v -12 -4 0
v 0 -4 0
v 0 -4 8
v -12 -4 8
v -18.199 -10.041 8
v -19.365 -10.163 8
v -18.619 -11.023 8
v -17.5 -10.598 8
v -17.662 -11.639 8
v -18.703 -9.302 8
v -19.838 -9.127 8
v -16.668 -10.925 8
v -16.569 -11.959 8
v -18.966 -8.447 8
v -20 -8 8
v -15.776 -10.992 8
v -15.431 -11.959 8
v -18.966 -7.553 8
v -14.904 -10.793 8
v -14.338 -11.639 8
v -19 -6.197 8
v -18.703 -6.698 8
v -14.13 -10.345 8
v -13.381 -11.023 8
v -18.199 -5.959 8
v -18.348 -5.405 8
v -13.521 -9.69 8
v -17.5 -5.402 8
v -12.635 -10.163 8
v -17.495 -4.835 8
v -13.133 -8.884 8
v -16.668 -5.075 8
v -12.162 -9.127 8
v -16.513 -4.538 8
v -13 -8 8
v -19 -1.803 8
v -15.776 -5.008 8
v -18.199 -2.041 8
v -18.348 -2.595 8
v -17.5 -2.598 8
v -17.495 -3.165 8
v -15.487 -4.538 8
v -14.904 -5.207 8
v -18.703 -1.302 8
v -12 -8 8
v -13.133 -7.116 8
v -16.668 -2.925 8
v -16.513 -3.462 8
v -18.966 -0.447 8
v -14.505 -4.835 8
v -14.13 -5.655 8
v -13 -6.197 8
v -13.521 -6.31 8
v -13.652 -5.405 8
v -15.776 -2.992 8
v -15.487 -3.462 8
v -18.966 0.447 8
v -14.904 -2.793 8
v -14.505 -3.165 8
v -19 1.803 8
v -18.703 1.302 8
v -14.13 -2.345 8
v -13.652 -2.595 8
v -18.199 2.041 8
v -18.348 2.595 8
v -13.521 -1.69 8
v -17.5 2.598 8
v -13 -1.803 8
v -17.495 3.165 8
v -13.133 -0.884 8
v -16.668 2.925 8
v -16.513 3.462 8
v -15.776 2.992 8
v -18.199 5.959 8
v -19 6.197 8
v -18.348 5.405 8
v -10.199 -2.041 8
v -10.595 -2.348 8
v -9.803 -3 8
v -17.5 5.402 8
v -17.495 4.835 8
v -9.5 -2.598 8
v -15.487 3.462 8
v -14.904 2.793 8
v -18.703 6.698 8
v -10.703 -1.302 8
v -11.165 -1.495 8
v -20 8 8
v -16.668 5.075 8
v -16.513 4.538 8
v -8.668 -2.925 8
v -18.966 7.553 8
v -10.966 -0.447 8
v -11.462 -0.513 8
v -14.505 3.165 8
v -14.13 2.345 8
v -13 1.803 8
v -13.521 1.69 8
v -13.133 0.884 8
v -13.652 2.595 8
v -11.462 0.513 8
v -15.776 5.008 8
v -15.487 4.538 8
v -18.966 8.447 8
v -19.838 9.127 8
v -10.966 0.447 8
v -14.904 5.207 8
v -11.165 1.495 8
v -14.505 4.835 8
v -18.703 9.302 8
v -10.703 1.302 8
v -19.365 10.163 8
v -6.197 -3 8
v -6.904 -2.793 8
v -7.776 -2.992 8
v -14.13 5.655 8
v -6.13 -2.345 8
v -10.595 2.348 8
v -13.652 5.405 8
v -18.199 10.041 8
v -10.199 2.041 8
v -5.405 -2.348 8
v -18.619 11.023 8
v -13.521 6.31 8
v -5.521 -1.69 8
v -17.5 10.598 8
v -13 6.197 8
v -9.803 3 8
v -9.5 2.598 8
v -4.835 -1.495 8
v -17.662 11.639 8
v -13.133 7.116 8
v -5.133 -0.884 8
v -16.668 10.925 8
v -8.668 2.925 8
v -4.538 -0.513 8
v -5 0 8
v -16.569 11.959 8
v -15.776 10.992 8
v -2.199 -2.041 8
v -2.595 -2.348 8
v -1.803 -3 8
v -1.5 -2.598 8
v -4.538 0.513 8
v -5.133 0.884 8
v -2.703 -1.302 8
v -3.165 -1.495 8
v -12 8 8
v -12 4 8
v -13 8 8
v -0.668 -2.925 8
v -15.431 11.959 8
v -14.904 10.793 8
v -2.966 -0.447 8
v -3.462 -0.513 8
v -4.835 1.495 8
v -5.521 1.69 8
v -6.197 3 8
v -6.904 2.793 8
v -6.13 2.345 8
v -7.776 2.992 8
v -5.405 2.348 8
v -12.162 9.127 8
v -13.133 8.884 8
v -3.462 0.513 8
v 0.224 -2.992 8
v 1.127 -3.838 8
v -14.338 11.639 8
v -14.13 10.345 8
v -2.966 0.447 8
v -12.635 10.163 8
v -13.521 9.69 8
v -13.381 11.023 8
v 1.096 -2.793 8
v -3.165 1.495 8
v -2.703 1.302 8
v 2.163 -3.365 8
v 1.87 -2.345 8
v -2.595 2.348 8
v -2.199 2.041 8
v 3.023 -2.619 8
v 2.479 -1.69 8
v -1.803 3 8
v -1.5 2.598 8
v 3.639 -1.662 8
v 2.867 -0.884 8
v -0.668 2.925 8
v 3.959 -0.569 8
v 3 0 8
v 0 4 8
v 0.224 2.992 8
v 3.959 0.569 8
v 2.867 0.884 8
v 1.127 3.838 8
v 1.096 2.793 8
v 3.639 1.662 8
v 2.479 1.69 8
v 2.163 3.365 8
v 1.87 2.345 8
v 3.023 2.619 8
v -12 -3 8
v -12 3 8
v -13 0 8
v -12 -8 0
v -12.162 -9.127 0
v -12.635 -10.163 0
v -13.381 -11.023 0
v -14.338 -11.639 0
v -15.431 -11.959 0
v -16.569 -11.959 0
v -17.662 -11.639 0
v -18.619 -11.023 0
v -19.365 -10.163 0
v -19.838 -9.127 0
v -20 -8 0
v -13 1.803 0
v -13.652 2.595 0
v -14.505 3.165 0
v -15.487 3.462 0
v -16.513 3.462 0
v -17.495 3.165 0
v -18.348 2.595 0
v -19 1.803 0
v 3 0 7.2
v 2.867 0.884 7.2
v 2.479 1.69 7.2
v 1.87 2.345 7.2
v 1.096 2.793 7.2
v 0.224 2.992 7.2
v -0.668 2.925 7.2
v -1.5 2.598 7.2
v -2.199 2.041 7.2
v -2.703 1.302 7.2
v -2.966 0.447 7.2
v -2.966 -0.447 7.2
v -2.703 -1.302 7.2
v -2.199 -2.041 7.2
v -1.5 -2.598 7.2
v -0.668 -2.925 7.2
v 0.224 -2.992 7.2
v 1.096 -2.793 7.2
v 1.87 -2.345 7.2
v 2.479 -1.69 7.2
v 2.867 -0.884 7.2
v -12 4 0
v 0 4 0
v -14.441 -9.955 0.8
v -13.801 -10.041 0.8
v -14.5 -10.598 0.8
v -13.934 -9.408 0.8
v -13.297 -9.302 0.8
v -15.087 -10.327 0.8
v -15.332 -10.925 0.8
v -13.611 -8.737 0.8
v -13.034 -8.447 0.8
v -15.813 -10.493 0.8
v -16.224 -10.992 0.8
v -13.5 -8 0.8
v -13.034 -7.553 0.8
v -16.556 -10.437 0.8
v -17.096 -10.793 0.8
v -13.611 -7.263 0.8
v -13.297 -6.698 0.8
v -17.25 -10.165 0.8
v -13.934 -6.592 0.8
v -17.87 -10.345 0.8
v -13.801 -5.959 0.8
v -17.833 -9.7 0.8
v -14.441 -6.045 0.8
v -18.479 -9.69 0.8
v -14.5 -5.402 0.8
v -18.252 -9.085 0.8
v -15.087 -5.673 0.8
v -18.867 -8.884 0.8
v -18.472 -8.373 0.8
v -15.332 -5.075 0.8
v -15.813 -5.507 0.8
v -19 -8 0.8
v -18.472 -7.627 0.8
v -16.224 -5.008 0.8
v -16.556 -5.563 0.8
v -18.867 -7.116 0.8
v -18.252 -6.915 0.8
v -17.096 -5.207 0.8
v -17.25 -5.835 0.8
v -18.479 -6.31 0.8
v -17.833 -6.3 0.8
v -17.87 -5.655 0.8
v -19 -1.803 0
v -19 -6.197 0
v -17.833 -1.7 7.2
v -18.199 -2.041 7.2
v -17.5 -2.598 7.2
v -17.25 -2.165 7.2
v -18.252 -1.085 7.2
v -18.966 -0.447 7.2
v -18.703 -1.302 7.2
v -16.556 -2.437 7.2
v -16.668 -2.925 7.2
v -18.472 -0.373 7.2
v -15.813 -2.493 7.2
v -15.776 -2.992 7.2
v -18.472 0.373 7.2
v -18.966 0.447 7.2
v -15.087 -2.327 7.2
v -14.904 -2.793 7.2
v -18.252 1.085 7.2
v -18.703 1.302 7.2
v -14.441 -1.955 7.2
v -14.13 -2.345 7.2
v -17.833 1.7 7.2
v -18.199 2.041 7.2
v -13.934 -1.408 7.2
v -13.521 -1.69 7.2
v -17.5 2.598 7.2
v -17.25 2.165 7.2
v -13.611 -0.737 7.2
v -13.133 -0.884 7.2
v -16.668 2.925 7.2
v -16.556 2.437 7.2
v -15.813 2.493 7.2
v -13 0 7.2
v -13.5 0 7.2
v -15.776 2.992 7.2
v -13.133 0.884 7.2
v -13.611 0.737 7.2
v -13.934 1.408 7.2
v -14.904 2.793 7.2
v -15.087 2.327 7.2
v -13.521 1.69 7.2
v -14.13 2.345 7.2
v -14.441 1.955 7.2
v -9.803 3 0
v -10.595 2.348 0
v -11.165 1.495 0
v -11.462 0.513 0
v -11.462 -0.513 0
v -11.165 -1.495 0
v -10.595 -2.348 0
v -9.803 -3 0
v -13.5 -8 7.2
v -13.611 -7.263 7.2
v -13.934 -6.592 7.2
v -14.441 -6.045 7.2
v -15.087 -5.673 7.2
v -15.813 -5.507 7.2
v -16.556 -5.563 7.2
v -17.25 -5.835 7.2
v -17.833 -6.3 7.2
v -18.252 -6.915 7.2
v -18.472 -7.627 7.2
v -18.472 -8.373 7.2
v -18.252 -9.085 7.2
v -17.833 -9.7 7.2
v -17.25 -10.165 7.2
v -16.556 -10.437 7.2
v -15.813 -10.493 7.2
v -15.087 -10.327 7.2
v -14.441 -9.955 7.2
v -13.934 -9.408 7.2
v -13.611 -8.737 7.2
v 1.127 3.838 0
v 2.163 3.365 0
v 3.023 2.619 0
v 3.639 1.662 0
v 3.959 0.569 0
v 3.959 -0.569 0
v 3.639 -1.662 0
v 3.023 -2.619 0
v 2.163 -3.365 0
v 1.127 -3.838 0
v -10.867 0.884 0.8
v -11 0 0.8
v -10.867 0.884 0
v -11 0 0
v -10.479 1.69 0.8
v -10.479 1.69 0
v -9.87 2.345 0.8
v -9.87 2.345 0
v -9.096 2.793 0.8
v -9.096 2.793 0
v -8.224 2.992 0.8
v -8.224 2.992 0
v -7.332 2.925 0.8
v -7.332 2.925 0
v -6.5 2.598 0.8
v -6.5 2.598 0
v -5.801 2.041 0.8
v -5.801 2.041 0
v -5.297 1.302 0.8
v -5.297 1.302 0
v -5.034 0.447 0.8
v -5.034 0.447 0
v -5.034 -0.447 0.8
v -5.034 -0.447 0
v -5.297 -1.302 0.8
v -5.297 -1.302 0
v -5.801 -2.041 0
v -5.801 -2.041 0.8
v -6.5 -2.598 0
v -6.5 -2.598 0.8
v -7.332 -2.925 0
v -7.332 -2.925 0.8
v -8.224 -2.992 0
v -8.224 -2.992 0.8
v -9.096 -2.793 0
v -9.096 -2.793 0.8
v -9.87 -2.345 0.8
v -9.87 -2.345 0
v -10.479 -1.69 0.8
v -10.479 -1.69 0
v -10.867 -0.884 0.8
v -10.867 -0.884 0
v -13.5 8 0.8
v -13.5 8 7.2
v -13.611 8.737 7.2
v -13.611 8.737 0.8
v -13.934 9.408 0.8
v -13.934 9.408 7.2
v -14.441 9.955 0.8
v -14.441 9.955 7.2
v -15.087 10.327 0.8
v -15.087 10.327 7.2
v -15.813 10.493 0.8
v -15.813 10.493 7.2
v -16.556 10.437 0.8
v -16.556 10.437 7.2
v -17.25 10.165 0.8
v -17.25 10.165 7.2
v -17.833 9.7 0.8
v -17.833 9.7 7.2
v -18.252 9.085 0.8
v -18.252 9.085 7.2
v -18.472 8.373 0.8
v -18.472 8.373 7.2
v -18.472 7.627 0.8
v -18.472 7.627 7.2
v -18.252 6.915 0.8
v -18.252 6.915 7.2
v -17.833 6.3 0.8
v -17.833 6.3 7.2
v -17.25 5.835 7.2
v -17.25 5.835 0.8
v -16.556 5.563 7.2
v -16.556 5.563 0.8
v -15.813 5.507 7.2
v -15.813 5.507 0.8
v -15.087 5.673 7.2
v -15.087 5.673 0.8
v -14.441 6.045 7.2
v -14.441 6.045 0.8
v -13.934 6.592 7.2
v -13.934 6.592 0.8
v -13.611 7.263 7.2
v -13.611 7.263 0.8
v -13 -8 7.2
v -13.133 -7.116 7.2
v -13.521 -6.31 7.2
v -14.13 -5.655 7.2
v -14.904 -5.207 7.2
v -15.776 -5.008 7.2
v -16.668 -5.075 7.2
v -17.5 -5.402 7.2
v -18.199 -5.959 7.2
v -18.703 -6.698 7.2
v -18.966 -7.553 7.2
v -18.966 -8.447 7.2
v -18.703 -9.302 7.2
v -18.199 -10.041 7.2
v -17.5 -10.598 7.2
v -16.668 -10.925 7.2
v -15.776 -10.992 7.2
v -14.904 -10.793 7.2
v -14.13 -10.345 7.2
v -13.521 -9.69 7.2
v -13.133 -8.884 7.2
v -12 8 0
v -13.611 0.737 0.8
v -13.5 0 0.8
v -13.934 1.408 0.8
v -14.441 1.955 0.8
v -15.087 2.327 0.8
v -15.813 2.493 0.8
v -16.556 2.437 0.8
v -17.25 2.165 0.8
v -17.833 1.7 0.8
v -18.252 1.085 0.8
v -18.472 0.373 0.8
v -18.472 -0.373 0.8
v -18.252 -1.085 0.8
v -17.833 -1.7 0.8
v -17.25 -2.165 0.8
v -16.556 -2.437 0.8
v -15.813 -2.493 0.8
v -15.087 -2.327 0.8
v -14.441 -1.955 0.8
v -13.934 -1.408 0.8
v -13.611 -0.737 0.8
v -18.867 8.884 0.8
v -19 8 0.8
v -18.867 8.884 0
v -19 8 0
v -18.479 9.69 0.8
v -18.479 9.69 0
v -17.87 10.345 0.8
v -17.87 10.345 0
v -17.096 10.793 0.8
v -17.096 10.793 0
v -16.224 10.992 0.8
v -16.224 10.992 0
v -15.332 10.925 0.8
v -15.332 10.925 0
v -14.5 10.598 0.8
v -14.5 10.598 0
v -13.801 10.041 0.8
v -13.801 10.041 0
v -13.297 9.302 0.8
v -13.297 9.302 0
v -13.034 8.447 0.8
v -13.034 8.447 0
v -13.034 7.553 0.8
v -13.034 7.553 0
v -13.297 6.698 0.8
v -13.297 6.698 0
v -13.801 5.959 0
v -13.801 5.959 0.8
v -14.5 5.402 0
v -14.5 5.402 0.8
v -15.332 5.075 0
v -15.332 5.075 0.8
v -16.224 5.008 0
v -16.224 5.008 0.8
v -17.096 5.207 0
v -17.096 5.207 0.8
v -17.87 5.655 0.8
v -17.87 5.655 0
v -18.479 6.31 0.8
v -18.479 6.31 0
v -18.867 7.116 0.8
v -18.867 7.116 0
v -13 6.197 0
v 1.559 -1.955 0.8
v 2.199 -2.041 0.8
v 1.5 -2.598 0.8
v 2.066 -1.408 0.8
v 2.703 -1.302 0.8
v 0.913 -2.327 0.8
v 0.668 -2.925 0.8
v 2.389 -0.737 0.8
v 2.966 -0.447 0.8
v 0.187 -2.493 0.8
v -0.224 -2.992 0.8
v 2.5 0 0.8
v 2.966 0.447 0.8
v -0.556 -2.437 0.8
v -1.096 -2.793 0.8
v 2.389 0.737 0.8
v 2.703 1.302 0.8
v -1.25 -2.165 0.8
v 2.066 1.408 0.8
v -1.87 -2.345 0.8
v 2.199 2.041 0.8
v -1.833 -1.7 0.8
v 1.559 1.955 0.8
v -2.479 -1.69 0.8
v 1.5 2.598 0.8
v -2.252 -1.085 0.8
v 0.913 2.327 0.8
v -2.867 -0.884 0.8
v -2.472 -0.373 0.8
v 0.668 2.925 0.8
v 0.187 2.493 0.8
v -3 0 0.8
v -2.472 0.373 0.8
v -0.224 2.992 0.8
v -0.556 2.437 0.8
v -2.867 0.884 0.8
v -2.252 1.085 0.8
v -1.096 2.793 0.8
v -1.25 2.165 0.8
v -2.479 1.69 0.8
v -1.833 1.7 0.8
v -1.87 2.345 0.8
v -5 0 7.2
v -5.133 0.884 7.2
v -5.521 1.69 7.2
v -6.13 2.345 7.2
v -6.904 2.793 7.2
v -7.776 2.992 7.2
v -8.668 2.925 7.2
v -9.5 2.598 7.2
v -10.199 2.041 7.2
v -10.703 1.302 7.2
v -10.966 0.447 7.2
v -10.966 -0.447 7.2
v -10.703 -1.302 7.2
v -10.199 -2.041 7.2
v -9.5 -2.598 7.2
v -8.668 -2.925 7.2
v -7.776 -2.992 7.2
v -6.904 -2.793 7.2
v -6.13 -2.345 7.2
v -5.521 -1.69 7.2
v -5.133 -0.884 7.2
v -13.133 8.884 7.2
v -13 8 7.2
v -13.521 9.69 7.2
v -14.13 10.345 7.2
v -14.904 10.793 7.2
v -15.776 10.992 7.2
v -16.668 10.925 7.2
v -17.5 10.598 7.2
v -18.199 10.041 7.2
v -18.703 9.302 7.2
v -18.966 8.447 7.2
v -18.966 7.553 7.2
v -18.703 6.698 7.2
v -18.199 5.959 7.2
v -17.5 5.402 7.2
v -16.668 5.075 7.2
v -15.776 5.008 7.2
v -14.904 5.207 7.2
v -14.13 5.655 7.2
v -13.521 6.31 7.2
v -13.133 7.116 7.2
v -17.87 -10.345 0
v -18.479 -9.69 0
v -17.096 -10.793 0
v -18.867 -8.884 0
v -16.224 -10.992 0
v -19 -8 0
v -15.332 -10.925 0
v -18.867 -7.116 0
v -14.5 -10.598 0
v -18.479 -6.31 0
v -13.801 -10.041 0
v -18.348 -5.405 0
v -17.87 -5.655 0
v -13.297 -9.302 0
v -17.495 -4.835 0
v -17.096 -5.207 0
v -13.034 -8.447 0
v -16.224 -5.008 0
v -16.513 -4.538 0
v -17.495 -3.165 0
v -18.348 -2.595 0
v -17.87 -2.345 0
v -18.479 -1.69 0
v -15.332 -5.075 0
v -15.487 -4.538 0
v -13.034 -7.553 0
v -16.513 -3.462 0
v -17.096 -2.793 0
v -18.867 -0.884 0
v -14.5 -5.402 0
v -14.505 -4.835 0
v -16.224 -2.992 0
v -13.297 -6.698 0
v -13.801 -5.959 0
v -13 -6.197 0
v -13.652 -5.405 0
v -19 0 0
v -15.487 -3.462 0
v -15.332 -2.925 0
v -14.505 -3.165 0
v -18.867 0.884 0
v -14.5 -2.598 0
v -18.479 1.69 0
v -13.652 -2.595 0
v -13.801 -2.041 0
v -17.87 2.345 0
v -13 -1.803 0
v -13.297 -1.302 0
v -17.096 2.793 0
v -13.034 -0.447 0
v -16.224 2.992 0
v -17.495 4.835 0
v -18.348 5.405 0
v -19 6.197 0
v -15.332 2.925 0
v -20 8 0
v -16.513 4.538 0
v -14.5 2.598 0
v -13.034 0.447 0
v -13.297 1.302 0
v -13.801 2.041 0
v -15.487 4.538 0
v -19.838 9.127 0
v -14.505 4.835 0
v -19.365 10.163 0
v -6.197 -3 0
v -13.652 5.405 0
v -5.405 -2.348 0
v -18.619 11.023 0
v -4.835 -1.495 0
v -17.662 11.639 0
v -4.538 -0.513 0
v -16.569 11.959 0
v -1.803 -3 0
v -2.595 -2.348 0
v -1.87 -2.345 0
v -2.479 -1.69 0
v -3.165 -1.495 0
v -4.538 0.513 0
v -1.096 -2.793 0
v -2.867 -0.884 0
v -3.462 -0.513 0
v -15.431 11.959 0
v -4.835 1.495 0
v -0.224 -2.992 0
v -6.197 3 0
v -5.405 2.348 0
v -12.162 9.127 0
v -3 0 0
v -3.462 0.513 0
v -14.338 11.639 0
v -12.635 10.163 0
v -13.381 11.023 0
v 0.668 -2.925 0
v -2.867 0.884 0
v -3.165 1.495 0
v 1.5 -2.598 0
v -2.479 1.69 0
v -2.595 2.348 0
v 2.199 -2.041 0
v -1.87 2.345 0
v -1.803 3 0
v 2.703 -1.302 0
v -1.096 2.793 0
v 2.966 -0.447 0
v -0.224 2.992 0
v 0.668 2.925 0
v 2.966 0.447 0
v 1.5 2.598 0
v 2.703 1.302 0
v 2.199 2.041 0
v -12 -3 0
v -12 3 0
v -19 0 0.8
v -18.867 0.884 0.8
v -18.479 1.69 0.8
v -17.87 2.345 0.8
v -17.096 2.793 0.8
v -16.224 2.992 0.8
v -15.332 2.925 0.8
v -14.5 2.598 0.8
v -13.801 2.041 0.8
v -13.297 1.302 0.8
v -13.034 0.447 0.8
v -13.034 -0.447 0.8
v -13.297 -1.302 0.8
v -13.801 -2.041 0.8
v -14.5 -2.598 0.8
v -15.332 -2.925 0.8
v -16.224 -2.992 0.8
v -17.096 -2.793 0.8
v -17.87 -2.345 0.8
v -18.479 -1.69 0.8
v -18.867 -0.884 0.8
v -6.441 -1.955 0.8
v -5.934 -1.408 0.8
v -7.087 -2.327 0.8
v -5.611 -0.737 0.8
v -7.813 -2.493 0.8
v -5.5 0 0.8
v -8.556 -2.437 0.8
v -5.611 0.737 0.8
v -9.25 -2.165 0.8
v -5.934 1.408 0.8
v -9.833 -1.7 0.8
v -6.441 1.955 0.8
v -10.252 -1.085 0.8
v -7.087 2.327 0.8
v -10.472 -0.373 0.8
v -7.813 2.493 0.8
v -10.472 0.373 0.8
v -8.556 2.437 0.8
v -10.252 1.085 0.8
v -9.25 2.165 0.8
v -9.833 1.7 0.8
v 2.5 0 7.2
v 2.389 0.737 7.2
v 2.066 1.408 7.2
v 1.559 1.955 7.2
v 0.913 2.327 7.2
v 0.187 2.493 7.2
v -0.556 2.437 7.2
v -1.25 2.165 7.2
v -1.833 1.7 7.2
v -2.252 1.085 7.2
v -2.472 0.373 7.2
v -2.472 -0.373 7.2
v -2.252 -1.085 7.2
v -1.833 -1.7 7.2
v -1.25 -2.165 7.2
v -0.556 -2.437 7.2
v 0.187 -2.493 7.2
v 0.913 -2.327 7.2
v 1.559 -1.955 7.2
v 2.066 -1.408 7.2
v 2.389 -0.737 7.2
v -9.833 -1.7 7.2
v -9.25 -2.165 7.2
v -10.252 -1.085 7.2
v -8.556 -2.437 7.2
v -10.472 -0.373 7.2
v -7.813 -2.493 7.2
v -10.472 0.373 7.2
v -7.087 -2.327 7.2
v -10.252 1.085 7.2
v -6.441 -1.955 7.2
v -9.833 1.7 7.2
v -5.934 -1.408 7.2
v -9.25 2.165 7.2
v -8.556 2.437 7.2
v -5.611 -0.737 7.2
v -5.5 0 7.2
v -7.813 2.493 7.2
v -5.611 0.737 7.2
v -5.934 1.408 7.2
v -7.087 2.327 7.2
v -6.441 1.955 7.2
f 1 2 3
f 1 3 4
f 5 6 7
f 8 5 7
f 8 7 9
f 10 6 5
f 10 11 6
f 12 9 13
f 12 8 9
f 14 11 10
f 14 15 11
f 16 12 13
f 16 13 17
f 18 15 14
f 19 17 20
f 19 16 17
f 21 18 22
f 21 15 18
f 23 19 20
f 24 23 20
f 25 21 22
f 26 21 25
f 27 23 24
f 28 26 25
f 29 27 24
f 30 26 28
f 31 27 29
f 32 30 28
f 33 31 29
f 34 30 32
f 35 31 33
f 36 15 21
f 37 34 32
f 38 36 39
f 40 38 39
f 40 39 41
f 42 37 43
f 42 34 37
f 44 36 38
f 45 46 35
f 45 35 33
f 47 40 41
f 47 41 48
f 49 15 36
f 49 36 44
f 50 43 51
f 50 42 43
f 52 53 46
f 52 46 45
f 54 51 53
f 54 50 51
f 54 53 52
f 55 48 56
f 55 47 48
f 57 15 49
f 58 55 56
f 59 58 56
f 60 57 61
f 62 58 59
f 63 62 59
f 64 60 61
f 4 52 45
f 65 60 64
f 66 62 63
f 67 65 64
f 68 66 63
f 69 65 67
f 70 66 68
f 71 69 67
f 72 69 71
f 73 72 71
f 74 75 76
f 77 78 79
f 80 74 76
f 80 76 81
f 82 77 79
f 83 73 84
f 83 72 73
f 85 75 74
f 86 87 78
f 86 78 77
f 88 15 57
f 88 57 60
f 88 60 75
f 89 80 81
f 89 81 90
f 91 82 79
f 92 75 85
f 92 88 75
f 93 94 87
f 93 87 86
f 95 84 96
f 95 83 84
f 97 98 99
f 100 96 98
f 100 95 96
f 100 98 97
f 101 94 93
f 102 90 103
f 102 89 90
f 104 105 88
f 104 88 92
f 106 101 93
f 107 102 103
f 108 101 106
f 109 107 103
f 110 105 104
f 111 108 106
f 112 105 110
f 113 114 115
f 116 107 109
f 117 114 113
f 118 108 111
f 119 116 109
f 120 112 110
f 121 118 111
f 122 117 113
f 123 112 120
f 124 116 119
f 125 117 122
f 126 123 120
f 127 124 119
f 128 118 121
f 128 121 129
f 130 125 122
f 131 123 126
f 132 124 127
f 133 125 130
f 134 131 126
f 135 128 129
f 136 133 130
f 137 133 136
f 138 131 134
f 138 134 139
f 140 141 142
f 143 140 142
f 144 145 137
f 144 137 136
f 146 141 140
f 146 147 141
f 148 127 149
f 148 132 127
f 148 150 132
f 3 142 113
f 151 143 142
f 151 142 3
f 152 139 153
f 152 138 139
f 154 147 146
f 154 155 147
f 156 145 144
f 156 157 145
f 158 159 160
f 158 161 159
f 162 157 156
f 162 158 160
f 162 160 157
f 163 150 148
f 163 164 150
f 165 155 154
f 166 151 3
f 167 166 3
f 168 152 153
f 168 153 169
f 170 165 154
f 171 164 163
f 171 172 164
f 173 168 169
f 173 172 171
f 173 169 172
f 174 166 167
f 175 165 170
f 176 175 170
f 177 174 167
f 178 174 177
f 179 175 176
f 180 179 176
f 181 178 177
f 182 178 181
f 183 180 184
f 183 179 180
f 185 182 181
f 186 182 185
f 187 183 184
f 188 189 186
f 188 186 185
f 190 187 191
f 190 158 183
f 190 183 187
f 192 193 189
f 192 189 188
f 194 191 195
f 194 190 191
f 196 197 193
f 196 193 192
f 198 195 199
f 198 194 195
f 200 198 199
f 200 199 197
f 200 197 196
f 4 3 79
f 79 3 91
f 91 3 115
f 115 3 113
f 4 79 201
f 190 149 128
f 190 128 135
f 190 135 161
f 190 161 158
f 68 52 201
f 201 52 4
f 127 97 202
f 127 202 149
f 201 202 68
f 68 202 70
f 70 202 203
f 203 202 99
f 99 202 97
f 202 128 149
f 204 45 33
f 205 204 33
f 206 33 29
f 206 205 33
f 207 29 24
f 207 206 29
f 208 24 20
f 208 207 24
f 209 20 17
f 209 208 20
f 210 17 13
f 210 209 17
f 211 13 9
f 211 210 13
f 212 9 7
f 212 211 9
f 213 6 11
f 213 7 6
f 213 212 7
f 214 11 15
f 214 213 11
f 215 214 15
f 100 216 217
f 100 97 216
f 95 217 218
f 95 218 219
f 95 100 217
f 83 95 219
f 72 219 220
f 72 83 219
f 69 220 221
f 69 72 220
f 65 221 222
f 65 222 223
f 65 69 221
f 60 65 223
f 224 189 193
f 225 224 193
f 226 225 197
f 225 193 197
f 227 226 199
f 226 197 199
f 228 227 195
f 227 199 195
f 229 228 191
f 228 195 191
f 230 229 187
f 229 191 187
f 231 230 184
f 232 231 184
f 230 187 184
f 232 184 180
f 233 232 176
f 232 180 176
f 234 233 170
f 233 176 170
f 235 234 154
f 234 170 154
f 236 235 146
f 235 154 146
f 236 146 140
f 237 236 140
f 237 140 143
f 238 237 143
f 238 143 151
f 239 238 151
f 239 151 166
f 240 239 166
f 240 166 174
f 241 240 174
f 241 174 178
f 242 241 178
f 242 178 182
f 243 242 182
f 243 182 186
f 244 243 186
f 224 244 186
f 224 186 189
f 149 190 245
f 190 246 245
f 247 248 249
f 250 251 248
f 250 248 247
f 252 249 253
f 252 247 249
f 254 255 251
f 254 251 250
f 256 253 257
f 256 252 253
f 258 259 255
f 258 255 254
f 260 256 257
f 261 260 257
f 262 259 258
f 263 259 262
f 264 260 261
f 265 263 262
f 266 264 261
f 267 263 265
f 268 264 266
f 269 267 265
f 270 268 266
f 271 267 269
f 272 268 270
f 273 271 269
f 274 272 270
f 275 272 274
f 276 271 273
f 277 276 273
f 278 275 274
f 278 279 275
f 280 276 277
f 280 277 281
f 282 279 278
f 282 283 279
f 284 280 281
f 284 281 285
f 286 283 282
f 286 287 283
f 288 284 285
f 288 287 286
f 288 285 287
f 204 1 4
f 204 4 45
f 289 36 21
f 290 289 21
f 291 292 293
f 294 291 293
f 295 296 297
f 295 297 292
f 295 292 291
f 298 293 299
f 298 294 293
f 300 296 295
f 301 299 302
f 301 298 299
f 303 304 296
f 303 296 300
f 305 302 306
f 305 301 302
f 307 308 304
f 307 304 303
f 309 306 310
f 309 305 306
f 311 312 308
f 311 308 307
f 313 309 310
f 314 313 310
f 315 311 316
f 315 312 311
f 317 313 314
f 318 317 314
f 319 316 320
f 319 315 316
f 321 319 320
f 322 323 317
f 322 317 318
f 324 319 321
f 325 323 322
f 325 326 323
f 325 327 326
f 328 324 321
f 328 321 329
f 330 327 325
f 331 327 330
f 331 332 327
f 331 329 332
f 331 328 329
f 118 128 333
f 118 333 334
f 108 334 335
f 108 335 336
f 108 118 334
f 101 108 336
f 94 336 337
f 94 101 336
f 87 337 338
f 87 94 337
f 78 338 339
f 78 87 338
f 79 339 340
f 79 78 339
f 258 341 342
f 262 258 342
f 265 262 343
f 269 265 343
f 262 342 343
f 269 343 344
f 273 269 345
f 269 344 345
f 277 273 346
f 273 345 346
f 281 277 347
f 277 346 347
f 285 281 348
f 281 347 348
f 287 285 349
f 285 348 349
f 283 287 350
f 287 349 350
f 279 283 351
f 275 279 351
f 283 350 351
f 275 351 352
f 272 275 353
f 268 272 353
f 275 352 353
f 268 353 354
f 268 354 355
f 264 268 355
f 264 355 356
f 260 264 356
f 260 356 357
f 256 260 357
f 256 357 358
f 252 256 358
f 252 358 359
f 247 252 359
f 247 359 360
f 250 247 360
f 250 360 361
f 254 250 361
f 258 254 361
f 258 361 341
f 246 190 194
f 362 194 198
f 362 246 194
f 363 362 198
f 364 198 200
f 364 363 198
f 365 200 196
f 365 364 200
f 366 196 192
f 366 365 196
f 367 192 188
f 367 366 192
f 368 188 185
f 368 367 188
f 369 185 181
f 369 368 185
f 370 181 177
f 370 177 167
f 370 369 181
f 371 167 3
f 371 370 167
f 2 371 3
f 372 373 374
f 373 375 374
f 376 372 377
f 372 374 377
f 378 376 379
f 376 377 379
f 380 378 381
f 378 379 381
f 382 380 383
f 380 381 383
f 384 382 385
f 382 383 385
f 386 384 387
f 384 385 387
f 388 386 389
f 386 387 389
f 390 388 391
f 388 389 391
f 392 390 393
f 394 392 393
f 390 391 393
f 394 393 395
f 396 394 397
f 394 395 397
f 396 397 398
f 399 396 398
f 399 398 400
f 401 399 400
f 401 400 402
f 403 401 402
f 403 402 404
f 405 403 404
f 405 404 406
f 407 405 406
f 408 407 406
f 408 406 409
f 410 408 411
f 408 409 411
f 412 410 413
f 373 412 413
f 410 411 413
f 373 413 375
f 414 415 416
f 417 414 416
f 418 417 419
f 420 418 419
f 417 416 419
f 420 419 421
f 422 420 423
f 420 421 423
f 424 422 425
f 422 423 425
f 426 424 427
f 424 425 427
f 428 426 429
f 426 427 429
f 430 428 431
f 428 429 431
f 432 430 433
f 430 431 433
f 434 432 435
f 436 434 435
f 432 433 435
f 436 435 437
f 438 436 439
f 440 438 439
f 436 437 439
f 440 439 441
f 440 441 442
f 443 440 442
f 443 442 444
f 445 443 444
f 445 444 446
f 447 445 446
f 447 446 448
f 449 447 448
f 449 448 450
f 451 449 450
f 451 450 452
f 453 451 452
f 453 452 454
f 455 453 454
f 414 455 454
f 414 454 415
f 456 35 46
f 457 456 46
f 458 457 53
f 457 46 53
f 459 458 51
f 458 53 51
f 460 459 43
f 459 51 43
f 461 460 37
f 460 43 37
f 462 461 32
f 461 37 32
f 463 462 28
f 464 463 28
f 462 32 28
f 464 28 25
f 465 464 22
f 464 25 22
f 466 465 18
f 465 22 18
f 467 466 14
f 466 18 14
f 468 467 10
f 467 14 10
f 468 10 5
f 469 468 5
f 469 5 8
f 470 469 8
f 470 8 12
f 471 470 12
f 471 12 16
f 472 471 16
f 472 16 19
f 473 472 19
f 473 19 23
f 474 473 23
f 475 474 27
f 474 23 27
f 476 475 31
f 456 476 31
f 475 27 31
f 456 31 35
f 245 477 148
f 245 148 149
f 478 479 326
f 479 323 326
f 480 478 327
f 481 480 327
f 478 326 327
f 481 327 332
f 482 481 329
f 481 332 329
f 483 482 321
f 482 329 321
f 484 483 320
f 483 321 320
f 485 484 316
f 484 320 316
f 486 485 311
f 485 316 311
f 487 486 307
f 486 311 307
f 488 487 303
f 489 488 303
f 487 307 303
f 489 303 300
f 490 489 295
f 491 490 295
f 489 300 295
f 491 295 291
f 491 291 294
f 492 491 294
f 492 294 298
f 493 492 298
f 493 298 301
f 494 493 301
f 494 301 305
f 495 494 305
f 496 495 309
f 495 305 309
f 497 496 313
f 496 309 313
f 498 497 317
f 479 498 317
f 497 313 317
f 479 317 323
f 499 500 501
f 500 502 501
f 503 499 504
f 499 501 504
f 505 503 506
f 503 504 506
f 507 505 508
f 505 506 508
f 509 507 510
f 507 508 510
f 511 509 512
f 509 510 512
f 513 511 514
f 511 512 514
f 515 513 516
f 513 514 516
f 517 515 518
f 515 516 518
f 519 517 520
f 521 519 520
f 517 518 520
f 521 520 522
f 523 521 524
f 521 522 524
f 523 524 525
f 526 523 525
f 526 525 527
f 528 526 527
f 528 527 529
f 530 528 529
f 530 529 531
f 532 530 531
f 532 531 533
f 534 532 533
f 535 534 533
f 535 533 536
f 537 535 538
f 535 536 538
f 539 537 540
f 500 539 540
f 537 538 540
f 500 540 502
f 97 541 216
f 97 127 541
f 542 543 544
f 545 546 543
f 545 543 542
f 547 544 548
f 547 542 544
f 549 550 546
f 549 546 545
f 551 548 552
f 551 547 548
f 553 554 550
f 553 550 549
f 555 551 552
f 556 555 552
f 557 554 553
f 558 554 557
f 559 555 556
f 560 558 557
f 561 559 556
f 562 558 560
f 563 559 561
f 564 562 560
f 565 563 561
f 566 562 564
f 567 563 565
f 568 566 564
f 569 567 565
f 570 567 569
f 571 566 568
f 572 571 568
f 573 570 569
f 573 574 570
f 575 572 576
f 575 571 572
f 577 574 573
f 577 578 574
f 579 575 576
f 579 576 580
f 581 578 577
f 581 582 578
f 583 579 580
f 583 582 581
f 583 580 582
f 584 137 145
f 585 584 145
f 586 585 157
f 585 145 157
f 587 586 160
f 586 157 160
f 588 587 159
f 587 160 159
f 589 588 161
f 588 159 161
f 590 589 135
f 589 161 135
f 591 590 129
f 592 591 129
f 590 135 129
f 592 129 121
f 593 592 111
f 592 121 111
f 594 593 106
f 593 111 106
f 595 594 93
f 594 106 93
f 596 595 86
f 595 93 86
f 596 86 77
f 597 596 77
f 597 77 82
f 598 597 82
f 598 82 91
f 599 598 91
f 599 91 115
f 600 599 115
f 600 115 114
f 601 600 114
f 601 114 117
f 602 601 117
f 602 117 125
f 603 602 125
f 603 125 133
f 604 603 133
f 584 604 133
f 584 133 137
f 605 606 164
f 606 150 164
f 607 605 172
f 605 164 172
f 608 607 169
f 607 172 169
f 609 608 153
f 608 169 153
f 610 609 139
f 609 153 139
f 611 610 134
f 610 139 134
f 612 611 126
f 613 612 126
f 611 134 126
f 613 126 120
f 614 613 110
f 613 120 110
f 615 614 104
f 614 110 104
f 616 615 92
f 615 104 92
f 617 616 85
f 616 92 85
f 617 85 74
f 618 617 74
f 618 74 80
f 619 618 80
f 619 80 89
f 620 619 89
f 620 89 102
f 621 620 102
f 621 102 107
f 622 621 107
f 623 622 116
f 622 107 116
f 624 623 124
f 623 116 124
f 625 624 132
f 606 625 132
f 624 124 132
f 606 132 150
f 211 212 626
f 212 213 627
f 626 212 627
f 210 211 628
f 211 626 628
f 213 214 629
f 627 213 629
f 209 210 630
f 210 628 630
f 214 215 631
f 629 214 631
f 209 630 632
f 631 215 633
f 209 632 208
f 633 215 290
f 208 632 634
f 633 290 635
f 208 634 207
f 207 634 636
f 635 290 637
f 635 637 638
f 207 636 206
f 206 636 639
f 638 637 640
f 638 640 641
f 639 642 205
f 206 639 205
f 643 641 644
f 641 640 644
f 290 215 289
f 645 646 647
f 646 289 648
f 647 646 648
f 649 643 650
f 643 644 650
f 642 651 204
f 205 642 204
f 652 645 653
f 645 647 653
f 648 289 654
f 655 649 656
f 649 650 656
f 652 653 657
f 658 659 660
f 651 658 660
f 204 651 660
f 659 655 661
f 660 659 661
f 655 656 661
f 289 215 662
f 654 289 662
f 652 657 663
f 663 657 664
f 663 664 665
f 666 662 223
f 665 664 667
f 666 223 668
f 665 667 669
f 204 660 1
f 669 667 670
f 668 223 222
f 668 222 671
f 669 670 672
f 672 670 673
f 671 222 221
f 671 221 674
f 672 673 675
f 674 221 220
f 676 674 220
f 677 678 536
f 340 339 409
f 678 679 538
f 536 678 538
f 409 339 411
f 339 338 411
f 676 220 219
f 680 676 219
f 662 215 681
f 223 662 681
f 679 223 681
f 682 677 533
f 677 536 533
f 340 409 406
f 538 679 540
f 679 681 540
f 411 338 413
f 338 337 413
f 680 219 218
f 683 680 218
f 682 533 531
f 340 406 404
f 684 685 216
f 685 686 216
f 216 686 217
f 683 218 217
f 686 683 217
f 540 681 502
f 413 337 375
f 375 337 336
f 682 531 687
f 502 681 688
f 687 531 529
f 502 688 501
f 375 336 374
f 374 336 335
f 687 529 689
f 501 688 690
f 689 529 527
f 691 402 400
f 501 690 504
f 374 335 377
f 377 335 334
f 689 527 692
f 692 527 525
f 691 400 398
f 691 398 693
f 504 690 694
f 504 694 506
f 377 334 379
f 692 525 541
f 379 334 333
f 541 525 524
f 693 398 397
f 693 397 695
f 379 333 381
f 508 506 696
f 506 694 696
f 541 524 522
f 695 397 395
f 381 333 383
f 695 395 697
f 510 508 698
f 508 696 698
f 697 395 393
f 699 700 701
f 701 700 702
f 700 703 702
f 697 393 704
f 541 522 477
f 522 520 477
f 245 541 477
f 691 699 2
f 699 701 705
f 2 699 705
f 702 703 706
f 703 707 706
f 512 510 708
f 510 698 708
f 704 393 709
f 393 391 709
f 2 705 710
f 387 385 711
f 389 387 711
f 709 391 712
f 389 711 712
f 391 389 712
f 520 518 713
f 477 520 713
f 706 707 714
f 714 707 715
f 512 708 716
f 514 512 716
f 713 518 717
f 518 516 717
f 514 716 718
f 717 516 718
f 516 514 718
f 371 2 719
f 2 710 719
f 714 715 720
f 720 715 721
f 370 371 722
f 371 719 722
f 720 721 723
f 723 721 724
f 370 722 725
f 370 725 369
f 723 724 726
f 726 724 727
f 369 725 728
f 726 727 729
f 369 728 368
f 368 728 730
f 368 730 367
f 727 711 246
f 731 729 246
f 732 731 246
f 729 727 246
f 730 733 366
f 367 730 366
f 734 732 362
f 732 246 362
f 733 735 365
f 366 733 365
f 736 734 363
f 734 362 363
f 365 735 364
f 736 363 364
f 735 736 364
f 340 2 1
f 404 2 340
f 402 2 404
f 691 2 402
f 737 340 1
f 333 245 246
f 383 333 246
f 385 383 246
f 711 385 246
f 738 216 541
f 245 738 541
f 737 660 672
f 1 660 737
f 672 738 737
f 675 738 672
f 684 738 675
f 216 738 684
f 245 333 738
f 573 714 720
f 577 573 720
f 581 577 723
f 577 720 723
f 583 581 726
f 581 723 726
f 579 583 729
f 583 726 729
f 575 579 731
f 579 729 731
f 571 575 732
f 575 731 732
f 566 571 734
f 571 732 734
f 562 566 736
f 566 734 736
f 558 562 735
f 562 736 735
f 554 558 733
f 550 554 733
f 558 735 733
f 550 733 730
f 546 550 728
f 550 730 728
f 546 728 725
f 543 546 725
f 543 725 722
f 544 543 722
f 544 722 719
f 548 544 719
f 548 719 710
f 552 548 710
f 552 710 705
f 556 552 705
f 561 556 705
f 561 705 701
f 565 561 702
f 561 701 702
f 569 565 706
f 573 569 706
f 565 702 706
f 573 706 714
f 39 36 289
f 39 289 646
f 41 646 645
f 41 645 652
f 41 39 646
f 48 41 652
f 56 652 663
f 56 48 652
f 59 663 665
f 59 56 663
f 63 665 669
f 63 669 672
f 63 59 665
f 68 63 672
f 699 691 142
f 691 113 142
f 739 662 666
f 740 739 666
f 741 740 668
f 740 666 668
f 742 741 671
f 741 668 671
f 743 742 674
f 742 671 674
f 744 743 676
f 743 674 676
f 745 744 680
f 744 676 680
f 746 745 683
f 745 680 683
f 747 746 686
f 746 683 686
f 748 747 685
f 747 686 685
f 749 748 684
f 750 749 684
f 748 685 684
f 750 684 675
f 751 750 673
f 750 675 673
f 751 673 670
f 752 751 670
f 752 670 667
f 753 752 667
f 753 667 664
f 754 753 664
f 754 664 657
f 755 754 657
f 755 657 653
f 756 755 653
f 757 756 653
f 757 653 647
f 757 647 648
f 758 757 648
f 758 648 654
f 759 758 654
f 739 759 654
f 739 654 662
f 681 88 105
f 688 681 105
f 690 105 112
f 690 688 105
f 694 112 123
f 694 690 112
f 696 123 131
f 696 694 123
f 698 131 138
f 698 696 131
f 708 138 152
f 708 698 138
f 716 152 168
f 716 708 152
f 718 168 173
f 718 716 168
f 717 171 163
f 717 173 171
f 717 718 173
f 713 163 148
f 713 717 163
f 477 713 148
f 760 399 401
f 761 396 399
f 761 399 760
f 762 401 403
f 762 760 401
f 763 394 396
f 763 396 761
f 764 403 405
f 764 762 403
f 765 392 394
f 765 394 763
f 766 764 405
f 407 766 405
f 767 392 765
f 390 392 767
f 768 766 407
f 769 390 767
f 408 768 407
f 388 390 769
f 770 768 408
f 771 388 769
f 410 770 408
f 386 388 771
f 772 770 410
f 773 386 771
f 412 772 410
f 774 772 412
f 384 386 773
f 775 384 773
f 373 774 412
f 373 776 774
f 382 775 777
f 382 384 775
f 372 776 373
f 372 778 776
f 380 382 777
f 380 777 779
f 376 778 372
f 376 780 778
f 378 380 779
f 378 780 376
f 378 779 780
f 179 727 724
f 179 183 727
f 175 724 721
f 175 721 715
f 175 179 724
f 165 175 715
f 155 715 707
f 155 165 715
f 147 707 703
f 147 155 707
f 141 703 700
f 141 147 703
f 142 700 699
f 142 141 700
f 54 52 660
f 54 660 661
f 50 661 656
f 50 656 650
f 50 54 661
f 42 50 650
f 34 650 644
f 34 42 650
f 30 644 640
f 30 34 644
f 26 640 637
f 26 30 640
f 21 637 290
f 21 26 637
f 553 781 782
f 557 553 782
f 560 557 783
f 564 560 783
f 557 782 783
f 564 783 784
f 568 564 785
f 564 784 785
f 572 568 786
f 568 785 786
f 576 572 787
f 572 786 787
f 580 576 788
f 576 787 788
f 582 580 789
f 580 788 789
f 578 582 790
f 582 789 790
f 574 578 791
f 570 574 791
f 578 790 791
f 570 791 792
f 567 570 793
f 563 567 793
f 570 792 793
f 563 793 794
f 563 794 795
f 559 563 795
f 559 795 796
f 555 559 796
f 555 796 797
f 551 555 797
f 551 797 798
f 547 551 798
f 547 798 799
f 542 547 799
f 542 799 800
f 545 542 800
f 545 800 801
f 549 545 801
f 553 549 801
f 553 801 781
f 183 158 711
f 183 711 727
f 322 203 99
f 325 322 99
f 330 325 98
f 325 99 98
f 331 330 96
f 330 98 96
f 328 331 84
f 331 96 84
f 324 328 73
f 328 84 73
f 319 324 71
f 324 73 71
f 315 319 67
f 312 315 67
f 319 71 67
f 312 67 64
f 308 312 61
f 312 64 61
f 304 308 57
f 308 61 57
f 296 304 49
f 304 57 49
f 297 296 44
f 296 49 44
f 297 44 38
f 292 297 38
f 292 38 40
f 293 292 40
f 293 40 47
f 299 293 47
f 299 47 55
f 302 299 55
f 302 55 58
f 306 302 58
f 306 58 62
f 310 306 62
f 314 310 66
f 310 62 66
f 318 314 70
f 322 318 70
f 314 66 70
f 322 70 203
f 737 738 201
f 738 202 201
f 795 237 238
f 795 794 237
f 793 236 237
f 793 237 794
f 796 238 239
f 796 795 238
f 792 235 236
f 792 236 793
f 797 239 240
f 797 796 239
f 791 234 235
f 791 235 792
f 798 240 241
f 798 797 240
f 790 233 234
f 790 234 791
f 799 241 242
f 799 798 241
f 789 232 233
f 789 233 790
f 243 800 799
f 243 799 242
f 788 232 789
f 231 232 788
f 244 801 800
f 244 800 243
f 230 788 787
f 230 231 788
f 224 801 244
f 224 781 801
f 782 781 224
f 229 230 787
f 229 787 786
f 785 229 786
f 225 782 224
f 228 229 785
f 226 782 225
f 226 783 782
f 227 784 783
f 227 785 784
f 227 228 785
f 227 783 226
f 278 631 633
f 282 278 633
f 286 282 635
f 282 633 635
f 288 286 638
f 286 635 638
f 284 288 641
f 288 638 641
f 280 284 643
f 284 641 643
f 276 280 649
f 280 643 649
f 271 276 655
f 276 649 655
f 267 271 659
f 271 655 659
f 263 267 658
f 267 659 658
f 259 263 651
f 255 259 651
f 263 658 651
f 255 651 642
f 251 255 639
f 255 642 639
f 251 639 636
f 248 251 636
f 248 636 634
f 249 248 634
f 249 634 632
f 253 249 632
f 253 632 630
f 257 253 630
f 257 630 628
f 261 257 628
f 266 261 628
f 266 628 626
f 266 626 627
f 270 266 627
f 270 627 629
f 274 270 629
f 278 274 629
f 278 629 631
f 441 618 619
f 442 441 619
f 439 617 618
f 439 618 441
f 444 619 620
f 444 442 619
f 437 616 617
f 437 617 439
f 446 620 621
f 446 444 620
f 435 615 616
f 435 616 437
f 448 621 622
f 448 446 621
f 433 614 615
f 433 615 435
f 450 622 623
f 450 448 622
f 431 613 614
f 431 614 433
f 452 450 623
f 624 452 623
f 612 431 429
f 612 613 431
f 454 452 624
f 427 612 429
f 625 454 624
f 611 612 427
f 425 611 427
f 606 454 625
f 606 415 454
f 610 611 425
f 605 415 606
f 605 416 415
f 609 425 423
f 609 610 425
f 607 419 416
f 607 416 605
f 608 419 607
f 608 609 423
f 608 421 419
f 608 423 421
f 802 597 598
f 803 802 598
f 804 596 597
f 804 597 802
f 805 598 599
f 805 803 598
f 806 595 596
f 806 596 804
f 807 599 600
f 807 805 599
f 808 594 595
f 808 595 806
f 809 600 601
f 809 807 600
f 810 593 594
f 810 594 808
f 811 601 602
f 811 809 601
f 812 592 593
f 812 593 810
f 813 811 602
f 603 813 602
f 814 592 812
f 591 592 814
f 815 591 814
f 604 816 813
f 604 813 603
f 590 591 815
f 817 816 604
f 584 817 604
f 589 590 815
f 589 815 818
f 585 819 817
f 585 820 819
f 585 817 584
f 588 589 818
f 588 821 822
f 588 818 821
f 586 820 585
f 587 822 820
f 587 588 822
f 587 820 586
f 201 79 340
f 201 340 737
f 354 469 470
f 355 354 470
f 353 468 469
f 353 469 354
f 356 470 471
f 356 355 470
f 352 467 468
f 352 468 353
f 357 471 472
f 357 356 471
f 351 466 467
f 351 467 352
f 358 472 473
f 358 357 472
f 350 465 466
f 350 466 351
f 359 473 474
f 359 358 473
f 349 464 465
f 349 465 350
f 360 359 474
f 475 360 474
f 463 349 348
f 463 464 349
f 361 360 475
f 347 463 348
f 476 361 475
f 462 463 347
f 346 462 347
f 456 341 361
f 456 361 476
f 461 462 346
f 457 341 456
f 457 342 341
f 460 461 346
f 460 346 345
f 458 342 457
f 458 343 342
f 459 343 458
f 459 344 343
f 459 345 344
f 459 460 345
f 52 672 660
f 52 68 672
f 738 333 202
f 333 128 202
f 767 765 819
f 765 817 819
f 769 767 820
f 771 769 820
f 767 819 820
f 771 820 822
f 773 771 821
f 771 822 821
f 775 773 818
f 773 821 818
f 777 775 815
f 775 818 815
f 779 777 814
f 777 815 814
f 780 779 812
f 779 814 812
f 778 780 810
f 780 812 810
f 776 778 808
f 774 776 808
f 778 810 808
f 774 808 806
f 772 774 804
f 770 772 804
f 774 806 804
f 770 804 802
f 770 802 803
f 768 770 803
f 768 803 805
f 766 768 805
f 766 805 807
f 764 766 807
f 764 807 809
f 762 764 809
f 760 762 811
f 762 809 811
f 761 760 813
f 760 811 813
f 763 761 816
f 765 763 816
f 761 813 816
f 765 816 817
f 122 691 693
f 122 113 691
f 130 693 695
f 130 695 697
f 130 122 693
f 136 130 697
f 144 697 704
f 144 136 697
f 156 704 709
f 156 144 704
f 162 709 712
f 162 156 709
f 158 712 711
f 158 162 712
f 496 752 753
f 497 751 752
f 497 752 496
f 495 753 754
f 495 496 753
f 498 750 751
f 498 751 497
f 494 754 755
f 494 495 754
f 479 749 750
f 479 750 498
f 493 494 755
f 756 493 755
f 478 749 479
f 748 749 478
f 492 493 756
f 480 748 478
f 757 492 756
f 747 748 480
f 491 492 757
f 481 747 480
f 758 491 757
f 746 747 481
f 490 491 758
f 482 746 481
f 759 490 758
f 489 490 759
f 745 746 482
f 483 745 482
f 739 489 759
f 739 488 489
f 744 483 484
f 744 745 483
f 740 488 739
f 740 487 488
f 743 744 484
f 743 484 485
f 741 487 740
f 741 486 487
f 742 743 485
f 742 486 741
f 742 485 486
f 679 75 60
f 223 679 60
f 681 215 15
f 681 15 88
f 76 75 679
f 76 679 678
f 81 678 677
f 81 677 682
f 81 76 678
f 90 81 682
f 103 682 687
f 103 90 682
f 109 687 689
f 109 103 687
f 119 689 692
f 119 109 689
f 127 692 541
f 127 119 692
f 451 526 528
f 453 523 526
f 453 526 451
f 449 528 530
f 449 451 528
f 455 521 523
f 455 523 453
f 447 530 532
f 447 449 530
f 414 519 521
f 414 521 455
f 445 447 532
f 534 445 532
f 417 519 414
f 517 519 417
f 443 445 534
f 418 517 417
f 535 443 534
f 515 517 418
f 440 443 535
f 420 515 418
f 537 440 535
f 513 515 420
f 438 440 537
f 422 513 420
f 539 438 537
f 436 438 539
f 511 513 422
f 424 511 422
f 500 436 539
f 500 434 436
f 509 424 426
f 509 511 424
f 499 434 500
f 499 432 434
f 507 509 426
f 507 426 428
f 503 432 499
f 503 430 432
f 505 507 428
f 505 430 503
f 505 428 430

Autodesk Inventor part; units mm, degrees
ref_plane "YZ Plane" through (0, 0, 0) normal (1, 0, 0) x (0, 1, 0)
ref_plane "XZ Plane" through (0, 0, 0) normal (0, 1, 0) x (-1, 0, 0)
ref_plane "XY Plane" through (0, 0, 0) normal (0, 0, 1) x (1, 0, 0)
sketch "Sketch1" plane through (0, 0, 0) normal (0, 0, 1) x (1, 0, 0)
  arc A0 (0, -4) -> (0, 4) centre (0, 0) ccw
  arc A1 (-12, 8) -> (-20, 8) centre (-16, 8) ccw
  arc A2 (-20, -8) -> (-12, -8) centre (-16, -8) ccw
  line L0 (-20, -8) -> (-20, 8)
  line L1 (0, 4) -> (-12, 4)
  line L2 (0, -4) -> (-12, -4)
  line L3 (-12, 8) -> (-12, 4)
  line L4 (-12, -4) -> (-12, -8)
  line L5 (-24.8, 0) -> (8.8, 0) projected
  line L6 (0, -16.8) -> (0, 16.8) projected
  dimension "d3" = 4
  dimension "d4" = 4
  dimension "d5" = 4
  dimension "d6" = 16
  dimension "d8" = 8
  dimension "d10" = 16
  dimension "d11" = 0
  dimension "d12" = 0
  dimension "d13" = 4
extrude "Extrusion1" add sketch "Sketch1" along normal blind 8
sketch "Sketch3" plane through (0, 0, 8) normal (0, 0, 1) x (1, 0, 0)
  arc A0 (0, -4) -> (0, 4) centre (0, 0) ccw projected
  circle A1 centre (0, 0) radius 2.5
  line L0 (-24.8, 0) -> (8.8, 0) projected
  circle A2 centre (-8, 0) radius 2.5
  dimension "d24" = 5
  dimension "d30" = 8
extrude "Extrusion2" cut sketch "Sketch3" against normal through all
sketch "Sketch4" plane through (0, 0, 8) normal (0, 0, 1) x (1, 0, 0)
  arc A0 (-20, -8) -> (-12, -8) centre (-16, -8) ccw projected
  circle A1 centre (-16, -8) radius 2.5
  line L0 (0, -16.8) -> (0, 16.8) projected
  circle A2 centre (-16, 0) radius 2.5
  circle A3 centre (-16, 8) radius 2.5
  dimension "d34" = 5
  dimension "d40" = 8
extrude "Extrusion3" cut sketch "Sketch4" against normal through all
sketch "Sketch5" plane through (0, 0, 8) normal (0, 0, 1) x (1, 0, 0)
  circle A0 centre (-16, 8) radius 2.5 projected
  circle A1 centre (-16, 0) radius 2.5 projected
  circle A2 centre (-16, -8) radius 2.5 projected
  circle A3 centre (-8, 0) radius 2.5 projected
  circle A4 centre (0, 0) radius 2.5 projected
  arc A5 (-20, -8) -> (-12, -8) centre (-16, -8) ccw projected
  arc A6 (0, -4) -> (0, 4) centre (0, 0) ccw projected
  arc A7 (-12, 8) -> (-20, 8) centre (-16, 8) ccw projected
  circle A8 centre (-16, -8) radius 3
  circle A9 centre (-16, 0) radius 3
  circle A10 centre (-16, 8) radius 3
  circle A11 centre (-8, 0) radius 3
  circle A12 centre (0, 0) radius 3
  dimension "d44" = 6
  dimension "d45" = 6
  dimension "d46" = 6
  dimension "d47" = 6
  dimension "d48" = 6
extrude "Extrusion4" cut sketch "Sketch5" against normal blind 0.8
sketch "Sketch6" plane through (0, 0, 0) normal (0, 0, -1) x (-1, 0, 0)
  circle A0 centre (16, 8) radius 2.5 projected
  circle A1 centre (16, 0) radius 2.5 projected
  circle A2 centre (16, -8) radius 2.5 projected
  circle A3 centre (8, 0) radius 2.5 projected
  circle A4 centre (0, 0) radius 2.5 projected
  arc A5 (12, -8) -> (20, -8) centre (16, -8) ccw projected
  arc A6 (20, 8) -> (12, 8) centre (16, 8) ccw projected
  arc A7 (0, 4) -> (0, -4) centre (0, 0) ccw projected
  circle A8 centre (8, 0) radius 3
  circle A9 centre (16, 8) radius 3
  circle A10 centre (0, 0) radius 3
  circle A11 centre (16, 0) radius 3
  circle A12 centre (16, -8) radius 3
  dimension "d52" = 6
  dimension "d53" = 6
  dimension "d54" = 6
  dimension "d55" = 6
  dimension "d56" = 6
extrude "Extrusion5" cut sketch "Sketch6" against normal blind 0.8
sketch "Sketch7" plane through (0, 0, 8) normal (0, 0, 1) x (1, 0, 0)
  circle A0 centre (-16, -8) radius 3 projected
  circle A1 centre (-16, 0) radius 3 projected
  arc A2 (-20, -8) -> (-12, -8) centre (-16, -8) ccw projected
  arc A3 (-13, -6.1972) -> (-19, -6.1972) centre (-16, -8) ccw
  line L0 (-19, -1.8028) -> (-19, -6.1972)
  line L1 (-13, -1.8028) -> (-13, -6.1972)
  arc A4 (-19, -1.8028) -> (-13, -1.8028) centre (-16, 0) ccw
  line L2 (0, -16.8) -> (0, 16.8) projected
  arc A5 (-13, 1.8028) -> (-19, 1.8028) centre (-16, 0) ccw
  line L3 (-19, 6.1972) -> (-19, 1.8028)
  line L4 (-13, 6.1972) -> (-13, 1.8028)
  arc A6 (-19, 6.1972) -> (-13, 6.1972) centre (-16, 8) ccw
  dimension "d59" = 3.5
  dimension "d60" = 3.5
  dimension "d66" = 8
extrude "Extrusion6" cut sketch "Sketch7" against normal through all contours A3 L0 A4 L1 | A5 L3 A6 L4
sketch "Sketch8" plane through (0, 0, 8) normal (0, 0, 1) x (1, 0, 0)
  line L0 (-13, -1.8028) -> (-13, -6.1972) projected
  circle A0 centre (-16, 0) radius 3 projected
  circle A1 centre (-8, 0) radius 3 projected
  arc A2 (0, -4) -> (0, 4) centre (0, 0) ccw projected
  line L1 (-12, 4) -> (0, 4) projected
  line L2 (-12, 8) -> (-12, 4) projected
  arc A3 (-1.8028, 3) -> (-1.8028, -3) centre (0, 0) ccw
  line L3 (-12, 3) -> (-12, -3)
  line L4 (-6.1972, -3) -> (-1.8028, -3)
  line L5 (-6.1972, 3) -> (-1.8028, 3)
  arc A4 (-9.8028, 3) -> (-9.8028, -3) centre (-8, 0) ccw
  arc A5 (-6.1972, -3) -> (-6.1972, 3) centre (-8, 0) ccw
  line L6 (-9.8028, 3) -> (-12, 3)
  line L7 (-9.8028, -3) -> (-12, -3)
  dimension "d72" = 3.5
  dimension "d73" = 3.5
  dimension "d74" = 3.5
  dimension "d75" = 2.1972
extrude "Extrusion7" cut sketch "Sketch8" against normal through all contours A3 L4 A5 L5 | L6 A4 L7 L3
properties part number "5TM Beam"
